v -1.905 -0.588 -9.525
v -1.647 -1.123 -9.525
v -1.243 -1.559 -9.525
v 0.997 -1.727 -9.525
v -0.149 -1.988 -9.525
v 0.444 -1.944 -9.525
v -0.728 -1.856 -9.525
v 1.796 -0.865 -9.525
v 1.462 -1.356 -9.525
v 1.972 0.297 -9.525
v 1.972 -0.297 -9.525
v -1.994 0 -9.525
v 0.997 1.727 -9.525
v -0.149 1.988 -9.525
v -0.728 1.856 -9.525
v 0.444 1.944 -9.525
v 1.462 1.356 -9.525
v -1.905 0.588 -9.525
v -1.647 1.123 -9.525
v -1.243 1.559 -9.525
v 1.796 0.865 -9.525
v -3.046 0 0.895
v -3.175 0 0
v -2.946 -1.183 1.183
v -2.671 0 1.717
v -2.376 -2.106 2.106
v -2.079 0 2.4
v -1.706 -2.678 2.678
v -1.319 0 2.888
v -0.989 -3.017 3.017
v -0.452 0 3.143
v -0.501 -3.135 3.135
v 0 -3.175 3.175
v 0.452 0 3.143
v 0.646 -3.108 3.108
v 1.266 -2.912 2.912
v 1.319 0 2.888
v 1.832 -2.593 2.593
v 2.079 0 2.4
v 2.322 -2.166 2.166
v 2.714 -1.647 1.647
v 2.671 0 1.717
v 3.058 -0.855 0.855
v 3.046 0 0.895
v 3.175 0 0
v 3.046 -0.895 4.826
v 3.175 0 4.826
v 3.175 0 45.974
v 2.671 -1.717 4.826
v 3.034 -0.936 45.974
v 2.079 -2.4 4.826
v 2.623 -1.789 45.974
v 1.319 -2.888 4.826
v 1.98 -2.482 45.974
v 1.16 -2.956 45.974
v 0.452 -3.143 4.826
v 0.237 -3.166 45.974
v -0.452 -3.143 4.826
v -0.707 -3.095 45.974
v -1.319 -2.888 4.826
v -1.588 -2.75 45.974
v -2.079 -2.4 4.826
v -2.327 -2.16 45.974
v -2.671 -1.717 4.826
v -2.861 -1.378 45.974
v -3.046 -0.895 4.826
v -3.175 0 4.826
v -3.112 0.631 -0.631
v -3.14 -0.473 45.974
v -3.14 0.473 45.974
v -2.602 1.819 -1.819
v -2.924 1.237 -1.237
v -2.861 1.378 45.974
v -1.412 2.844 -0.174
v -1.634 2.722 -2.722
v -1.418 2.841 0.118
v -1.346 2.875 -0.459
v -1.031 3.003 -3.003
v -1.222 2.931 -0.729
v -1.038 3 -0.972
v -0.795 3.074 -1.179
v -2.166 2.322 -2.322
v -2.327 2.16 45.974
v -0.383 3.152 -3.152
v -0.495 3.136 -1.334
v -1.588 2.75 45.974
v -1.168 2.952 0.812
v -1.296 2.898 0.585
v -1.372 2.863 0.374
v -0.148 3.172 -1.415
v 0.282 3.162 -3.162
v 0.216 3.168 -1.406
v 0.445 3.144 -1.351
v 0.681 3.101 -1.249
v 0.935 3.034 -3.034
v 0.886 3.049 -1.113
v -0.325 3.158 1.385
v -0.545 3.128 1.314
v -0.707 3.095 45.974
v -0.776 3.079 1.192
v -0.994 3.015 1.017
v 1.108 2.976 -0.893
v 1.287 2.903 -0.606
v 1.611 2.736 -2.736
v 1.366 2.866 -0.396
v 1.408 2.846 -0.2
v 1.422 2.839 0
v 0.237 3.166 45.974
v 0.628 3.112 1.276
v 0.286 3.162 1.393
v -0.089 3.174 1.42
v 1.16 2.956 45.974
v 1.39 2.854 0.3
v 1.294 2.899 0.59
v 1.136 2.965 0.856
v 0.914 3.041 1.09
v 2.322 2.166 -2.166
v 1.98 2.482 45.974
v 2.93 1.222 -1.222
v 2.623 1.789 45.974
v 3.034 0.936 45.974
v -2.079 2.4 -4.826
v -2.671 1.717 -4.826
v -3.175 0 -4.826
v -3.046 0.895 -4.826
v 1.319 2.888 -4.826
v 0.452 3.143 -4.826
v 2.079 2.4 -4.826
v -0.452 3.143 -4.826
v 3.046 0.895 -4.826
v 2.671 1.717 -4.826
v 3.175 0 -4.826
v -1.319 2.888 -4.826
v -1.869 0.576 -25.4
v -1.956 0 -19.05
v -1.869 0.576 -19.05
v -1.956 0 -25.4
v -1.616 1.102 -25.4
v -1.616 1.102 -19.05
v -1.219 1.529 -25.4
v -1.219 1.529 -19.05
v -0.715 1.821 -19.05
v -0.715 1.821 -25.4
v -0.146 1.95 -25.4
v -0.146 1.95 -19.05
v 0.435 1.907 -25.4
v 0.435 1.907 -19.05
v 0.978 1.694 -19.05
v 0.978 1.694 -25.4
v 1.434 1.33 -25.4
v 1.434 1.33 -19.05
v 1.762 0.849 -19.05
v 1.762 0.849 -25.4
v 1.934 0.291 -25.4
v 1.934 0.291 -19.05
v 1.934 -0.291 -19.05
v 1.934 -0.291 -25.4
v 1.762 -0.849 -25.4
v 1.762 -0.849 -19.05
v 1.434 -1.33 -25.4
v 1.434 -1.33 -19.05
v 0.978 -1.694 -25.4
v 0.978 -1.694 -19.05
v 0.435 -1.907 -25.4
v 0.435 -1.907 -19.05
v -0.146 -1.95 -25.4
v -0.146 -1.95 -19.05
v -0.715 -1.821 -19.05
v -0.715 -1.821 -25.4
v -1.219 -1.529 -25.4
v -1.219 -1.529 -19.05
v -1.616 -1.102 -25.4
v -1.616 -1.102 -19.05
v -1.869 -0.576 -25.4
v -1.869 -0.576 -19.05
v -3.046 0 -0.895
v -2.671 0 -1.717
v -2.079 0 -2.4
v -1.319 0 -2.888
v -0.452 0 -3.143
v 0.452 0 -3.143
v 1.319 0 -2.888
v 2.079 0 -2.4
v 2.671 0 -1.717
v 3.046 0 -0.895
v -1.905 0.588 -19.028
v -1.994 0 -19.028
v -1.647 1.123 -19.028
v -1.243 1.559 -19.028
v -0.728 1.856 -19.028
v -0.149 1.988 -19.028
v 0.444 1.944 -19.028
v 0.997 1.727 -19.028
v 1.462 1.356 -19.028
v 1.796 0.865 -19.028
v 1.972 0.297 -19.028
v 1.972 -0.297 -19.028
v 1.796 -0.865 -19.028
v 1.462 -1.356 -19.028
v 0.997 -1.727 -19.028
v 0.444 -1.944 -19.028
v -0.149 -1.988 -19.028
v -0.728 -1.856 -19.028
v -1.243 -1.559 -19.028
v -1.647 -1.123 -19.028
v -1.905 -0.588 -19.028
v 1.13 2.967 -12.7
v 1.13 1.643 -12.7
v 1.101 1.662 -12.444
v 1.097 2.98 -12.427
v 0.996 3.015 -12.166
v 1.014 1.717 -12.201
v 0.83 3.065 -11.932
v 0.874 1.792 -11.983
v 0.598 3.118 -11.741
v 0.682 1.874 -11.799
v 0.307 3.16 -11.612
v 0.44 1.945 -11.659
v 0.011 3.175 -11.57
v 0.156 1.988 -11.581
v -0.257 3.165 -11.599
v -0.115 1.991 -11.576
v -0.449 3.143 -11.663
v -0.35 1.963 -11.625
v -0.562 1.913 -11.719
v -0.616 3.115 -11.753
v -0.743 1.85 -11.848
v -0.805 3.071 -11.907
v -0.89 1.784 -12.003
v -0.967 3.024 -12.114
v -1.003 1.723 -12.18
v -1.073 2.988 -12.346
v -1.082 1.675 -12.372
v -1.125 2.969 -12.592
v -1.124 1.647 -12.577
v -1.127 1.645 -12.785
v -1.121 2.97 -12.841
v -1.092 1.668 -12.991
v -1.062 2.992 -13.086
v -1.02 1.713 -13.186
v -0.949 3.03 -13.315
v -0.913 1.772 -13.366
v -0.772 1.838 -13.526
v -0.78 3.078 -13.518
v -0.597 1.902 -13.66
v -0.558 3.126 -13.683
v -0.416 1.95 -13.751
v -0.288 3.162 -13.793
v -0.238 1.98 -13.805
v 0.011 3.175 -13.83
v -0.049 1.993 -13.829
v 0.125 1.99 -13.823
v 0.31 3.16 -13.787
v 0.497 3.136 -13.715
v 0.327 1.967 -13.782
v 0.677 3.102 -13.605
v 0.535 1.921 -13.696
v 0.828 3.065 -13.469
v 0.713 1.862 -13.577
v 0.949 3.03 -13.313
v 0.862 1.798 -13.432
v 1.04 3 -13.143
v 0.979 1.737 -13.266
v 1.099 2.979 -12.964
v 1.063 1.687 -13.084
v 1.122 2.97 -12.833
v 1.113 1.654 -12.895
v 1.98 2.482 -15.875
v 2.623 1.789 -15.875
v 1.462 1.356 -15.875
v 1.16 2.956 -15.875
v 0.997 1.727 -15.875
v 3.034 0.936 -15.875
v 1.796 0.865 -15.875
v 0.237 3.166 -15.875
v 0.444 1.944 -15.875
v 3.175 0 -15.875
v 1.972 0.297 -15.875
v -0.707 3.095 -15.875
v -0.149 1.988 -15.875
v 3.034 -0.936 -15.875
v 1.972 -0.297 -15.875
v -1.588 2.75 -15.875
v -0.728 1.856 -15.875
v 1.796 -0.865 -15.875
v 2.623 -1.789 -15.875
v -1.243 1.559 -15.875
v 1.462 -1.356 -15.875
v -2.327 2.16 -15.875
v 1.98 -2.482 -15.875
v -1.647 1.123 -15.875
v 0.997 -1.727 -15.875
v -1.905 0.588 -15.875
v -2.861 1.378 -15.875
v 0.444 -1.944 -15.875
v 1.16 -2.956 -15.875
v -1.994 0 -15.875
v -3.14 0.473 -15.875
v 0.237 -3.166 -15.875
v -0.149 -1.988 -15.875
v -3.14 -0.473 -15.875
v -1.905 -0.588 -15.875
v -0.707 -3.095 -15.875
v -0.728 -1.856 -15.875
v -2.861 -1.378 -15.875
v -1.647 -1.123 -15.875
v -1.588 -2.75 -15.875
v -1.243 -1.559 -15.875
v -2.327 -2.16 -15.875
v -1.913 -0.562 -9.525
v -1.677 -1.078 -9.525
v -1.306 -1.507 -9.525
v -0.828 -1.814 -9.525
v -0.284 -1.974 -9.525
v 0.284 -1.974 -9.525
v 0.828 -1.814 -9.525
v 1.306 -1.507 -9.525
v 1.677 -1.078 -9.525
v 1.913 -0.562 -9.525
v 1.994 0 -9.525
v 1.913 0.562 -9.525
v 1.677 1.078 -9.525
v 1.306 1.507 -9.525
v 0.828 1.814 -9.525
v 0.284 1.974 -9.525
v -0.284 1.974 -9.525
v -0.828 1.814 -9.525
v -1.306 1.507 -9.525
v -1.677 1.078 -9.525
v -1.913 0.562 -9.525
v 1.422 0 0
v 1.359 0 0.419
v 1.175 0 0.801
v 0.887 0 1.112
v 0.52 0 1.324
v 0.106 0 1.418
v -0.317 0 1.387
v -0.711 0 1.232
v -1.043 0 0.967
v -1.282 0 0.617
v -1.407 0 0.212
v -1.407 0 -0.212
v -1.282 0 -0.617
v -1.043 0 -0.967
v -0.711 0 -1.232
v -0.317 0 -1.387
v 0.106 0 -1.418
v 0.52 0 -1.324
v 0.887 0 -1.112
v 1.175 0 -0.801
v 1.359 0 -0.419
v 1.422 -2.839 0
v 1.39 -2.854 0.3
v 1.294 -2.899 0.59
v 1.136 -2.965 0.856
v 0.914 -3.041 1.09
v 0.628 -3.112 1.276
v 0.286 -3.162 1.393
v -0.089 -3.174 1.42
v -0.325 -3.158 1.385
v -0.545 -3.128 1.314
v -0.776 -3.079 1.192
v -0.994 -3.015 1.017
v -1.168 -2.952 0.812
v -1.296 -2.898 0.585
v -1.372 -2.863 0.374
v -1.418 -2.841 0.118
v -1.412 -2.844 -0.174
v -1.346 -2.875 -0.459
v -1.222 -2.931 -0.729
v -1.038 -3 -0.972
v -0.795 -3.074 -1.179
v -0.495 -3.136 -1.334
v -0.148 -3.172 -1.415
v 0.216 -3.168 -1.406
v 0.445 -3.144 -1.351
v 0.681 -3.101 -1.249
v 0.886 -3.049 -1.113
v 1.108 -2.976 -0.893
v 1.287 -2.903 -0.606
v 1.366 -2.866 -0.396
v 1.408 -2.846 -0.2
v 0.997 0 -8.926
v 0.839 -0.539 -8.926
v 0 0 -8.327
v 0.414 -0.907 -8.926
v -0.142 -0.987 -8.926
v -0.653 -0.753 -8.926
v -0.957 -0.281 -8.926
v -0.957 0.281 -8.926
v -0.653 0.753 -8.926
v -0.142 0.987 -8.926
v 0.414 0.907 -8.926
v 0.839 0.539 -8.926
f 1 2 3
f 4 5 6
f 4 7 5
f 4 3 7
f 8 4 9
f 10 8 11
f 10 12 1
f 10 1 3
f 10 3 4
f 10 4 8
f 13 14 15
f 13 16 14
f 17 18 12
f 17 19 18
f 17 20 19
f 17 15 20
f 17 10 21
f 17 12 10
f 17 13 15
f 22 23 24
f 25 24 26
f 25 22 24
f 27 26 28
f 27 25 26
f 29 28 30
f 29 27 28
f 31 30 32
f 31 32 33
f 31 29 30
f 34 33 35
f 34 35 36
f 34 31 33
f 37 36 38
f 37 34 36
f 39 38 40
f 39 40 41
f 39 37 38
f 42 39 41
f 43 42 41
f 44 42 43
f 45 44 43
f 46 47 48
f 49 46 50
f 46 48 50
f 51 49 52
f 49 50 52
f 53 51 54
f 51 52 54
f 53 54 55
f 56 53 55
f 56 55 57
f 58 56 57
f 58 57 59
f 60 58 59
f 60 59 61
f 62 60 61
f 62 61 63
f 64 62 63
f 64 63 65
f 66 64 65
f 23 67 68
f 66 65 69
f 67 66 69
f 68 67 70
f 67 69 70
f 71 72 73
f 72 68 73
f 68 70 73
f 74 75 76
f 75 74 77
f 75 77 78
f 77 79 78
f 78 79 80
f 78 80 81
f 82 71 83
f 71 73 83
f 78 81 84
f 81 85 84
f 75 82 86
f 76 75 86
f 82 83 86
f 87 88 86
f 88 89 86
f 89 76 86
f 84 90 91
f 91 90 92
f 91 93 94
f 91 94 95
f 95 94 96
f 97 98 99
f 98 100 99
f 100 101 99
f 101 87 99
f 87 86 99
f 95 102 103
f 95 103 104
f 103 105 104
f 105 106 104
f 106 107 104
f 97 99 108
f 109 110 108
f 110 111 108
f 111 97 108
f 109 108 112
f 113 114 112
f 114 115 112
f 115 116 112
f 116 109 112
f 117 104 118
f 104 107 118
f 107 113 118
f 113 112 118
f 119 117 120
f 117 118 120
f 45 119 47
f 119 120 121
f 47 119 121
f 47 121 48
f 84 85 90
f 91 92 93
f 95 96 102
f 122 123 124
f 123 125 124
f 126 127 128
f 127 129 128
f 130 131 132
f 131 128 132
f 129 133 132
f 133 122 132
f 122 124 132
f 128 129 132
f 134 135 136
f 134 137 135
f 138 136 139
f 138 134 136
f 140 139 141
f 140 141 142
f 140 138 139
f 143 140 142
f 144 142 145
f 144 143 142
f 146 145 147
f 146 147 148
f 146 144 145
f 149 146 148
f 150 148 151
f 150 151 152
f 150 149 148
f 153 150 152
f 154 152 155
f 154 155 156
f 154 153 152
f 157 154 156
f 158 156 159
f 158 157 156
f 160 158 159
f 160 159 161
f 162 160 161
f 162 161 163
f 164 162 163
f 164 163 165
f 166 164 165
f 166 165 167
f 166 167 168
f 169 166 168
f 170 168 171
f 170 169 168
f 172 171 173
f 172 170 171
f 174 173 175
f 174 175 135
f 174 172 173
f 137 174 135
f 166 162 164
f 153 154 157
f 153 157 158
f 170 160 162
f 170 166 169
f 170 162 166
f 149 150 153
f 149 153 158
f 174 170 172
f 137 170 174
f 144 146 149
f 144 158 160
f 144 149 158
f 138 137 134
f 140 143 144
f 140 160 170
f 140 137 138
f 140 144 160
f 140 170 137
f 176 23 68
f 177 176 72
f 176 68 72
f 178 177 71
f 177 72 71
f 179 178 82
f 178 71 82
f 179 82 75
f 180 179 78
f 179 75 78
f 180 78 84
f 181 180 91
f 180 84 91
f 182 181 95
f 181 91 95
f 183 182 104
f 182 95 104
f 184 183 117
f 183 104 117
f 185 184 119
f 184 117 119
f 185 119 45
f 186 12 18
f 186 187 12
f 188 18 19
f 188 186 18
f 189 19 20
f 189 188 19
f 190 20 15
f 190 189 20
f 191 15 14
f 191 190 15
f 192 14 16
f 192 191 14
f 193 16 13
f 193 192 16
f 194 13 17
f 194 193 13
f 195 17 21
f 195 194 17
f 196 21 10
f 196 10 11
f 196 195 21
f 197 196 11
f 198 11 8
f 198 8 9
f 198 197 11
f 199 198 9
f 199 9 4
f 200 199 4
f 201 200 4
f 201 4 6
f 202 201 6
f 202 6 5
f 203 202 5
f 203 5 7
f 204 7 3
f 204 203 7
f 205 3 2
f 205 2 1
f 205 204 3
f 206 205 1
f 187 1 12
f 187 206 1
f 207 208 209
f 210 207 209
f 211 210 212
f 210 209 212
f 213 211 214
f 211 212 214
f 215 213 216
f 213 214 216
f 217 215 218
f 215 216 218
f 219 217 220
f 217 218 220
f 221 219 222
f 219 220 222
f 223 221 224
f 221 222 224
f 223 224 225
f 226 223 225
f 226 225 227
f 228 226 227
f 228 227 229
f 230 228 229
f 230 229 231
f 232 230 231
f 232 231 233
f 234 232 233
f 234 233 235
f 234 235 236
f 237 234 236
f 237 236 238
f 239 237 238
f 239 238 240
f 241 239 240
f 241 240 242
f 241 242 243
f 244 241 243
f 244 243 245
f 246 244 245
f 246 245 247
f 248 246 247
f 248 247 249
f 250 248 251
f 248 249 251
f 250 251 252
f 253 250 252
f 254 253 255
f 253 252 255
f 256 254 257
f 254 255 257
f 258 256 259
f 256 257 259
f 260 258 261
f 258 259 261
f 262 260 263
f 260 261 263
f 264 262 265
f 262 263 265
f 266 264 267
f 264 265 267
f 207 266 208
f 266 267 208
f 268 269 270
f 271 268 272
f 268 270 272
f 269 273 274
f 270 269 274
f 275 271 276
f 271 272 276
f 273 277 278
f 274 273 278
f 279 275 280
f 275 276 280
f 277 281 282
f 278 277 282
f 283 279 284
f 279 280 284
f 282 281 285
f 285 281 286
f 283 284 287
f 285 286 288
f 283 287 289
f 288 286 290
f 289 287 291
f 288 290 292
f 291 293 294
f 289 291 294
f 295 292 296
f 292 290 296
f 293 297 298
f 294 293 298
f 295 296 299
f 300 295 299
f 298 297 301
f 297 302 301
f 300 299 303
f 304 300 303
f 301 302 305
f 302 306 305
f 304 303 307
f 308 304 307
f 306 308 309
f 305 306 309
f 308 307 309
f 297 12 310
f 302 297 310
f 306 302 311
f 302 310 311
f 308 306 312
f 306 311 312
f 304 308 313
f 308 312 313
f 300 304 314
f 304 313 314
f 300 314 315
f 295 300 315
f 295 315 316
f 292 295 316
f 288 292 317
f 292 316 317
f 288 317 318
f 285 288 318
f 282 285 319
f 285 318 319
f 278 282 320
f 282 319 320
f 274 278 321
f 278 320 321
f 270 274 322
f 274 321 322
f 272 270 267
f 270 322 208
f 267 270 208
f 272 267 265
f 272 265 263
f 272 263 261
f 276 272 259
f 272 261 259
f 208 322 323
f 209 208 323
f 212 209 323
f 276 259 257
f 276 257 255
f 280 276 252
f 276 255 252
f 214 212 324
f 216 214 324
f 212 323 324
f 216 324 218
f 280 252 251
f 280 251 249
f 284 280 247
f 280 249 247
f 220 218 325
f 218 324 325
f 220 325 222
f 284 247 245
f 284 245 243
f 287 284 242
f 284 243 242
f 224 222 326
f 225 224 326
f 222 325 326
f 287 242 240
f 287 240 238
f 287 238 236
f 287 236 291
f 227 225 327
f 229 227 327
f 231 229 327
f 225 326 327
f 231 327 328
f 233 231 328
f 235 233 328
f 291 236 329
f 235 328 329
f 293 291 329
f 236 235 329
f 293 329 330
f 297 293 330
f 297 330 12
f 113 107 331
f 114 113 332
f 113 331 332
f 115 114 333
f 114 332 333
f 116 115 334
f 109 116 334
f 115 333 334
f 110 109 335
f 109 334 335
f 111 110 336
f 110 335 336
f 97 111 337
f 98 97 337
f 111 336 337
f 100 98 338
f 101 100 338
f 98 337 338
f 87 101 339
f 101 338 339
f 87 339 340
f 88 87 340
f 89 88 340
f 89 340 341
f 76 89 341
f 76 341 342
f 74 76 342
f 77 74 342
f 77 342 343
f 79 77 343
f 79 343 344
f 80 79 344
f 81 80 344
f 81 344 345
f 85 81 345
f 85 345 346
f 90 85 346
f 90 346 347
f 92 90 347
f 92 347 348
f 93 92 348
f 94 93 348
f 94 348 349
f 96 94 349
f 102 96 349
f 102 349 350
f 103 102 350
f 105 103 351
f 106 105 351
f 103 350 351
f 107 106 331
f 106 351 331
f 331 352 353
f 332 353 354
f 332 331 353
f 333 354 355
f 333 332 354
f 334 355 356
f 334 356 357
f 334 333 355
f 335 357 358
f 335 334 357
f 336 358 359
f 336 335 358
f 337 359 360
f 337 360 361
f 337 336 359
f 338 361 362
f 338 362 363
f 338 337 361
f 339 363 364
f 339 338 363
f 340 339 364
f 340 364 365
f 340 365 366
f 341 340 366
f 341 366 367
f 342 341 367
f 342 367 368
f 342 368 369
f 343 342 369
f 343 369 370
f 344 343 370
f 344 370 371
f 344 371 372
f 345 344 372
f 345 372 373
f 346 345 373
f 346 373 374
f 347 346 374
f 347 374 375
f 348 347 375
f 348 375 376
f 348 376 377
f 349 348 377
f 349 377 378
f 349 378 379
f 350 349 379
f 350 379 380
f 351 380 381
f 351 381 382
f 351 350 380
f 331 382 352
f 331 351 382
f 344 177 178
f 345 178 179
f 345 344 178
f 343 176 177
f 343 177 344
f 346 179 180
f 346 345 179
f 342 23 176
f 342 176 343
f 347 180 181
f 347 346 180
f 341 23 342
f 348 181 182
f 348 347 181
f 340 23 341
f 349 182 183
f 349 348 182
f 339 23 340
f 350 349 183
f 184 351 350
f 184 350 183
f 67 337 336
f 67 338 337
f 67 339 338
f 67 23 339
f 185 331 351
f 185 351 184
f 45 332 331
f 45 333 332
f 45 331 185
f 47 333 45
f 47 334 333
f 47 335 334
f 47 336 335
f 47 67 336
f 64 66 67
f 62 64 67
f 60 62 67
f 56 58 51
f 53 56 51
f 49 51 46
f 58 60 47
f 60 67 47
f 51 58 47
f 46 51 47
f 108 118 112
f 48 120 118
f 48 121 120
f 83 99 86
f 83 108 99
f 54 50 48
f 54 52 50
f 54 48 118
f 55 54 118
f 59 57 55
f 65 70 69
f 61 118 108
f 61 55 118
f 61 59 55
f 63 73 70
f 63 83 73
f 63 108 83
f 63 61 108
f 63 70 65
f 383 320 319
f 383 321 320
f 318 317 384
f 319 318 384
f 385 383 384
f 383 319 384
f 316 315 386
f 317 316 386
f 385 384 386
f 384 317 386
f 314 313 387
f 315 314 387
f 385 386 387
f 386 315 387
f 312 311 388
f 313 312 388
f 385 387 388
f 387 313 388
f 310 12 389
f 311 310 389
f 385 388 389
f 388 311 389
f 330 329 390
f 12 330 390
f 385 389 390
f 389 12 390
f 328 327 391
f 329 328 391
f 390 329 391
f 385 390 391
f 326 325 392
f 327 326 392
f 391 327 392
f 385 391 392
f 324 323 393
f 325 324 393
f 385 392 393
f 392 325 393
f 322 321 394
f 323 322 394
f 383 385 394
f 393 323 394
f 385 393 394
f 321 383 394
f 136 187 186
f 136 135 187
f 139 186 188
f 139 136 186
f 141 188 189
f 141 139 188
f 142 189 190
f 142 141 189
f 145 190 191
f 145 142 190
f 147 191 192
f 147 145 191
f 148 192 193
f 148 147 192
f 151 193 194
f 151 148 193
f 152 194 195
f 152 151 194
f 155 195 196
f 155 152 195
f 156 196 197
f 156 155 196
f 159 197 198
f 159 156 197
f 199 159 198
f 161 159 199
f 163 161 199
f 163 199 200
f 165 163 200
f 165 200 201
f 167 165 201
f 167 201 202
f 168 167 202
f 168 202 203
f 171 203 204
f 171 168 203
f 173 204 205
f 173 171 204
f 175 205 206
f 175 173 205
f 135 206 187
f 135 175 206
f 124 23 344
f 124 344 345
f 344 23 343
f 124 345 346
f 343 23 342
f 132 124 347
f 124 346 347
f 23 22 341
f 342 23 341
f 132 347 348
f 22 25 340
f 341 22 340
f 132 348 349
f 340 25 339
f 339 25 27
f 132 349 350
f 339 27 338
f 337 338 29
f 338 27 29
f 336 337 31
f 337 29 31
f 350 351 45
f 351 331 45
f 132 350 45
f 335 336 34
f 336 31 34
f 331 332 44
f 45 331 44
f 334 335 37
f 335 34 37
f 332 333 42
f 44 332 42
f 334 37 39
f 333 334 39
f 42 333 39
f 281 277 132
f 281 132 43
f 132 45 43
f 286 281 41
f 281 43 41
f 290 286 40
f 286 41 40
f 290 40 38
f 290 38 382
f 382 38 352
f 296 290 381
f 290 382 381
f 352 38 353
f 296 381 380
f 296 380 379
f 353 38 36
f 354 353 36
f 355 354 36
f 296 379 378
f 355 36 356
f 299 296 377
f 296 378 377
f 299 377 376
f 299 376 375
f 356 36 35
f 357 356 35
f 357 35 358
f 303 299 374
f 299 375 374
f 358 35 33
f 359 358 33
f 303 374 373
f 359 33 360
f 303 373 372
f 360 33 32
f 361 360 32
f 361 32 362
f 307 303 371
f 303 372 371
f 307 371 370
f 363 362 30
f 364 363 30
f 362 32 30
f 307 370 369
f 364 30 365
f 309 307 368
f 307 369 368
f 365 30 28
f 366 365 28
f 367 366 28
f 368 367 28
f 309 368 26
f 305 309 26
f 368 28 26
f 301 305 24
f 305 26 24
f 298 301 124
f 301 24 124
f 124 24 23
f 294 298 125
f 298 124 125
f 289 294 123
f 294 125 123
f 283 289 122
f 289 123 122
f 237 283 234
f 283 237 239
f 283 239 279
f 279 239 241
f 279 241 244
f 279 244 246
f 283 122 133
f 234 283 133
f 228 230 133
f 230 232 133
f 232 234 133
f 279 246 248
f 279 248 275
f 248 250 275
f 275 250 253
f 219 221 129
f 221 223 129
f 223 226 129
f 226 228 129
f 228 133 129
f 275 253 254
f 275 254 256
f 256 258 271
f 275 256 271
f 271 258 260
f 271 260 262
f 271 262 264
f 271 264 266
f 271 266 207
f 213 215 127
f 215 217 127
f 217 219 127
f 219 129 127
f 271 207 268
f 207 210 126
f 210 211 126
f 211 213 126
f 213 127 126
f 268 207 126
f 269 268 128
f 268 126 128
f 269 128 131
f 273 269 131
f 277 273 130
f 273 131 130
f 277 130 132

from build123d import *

# Parameters (mm, degrees)
F0_W      = 3.175
F0_H      = 50.8
F2_W      = 12.7
F2_H      = 9.652
F3_DEPTH  = 3.176
F4_R      = 1.4224
F5_DEPTH  = 3.176
F6_W      = 9.525
F6_H      = 12.7
F7_ANGLE  = 180
F8_W      = 3.175
F8_H      = 20.701
F10_DEPTH = 3.1760001015
F11_DEPTH = 3.1760001
F12_ANGLE = 180
F14_D     = 3.9878
F14_DEPTH = 6.35
F14_TIP   = 1.1980559883
F16_D     = 2.2606
F16_DEPTH = 3.1760001


with BuildPart() as f1:
    # F0 (on Front) → F1 (revolve)
    with BuildSketch(Plane.XZ):
        with Locations((1.5875, 20.574)):
            Rectangle(F0_W, F0_H)
    revolve(axis=Axis((0, 0, -0.0774394058), (0, 0, -1)))

    # F2 (on Front) → F3 (cut, through all)
    with BuildSketch(Plane.XZ):
        Rectangle(F2_W, F2_H)
    extrude(amount=F3_DEPTH, mode=Mode.SUBTRACT)

    # F4 (on Front) → F5 (cut, through all)
    with BuildSketch(Plane.XZ):
        Circle(F4_R)
    extrude(amount=-F5_DEPTH, mode=Mode.SUBTRACT)

    # F6 (on Top) → F7 (revolve, cut)
    with BuildSketch(Plane.XY):
        with Locations((-7.9375, 0)):
            Rectangle(F6_W, F6_H)
    revolve(axis=Axis((0, -3.175, 0), (0, -1, 0)), revolution_arc=F7_ANGLE, mode=Mode.SUBTRACT)


with BuildPart() as f9:
    # F8 (on Front) → F9 (revolve)
    with BuildSketch(Plane.XZ):
        with Locations((1.5875, -5.5245)):
            Rectangle(F8_W, F8_H)
    revolve(axis=Axis((0, 0, -13.9308571815), (0, 0, -1)))

    # F2 (on Front) → F10 (cut, through all)
    with BuildSketch(Plane.XZ):
        Rectangle(F2_W, F2_H)
    extrude(amount=-F10_DEPTH, mode=Mode.SUBTRACT)

    # F4 (on Front) → F11 (cut, through all)
    with BuildSketch(Plane.XZ):
        Circle(F4_R)
    extrude(amount=F11_DEPTH, mode=Mode.SUBTRACT)

    # F6 (on Top) → F12 (revolve, cut)
    with BuildSketch(Plane.XY):
        with Locations((-7.9375, 0)):
            Rectangle(F6_W, F6_H)
    revolve(axis=Axis((0, -3.175, 0), (0, 1, 0)), revolution_arc=F12_ANGLE, mode=Mode.SUBTRACT)

    # F14
    with Locations(Plane(origin=(0, 0, -15.875), x_dir=(1, 0, 0), z_dir=(0, 0, -1))):
        with Locations((0, 0)):
            Hole(F14_D / 2, depth=F14_DEPTH)
            with Locations((0, 0, -(F14_DEPTH + F14_TIP / 2))):  # 118° drill point
                Cone(0, F14_D / 2, F14_TIP, mode=Mode.SUBTRACT)

    # F16 (through all, one way)
    with BuildSketch(Plane.XZ):
        with Locations((0, -12.7)):
            Circle(F16_D / 2)
    extrude(amount=-F16_DEPTH, mode=Mode.SUBTRACT)


with BuildPart() as f18:
    # F17 (on Front) → F18 (revolve)
    with BuildSketch(Plane.XZ):
        Polygon((-1.9558, -25.4), (0, -25.4), (0, -9.525), (-1.9939, -9.525), (-1.9939, -19.0280029547), (-1.9558, -19.05), align=None)
    revolve(axis=Axis((0, 0, -19.8815774623), (0, 0, -1)))


solid = Compound([f1.part, f9.part, f18.part])
